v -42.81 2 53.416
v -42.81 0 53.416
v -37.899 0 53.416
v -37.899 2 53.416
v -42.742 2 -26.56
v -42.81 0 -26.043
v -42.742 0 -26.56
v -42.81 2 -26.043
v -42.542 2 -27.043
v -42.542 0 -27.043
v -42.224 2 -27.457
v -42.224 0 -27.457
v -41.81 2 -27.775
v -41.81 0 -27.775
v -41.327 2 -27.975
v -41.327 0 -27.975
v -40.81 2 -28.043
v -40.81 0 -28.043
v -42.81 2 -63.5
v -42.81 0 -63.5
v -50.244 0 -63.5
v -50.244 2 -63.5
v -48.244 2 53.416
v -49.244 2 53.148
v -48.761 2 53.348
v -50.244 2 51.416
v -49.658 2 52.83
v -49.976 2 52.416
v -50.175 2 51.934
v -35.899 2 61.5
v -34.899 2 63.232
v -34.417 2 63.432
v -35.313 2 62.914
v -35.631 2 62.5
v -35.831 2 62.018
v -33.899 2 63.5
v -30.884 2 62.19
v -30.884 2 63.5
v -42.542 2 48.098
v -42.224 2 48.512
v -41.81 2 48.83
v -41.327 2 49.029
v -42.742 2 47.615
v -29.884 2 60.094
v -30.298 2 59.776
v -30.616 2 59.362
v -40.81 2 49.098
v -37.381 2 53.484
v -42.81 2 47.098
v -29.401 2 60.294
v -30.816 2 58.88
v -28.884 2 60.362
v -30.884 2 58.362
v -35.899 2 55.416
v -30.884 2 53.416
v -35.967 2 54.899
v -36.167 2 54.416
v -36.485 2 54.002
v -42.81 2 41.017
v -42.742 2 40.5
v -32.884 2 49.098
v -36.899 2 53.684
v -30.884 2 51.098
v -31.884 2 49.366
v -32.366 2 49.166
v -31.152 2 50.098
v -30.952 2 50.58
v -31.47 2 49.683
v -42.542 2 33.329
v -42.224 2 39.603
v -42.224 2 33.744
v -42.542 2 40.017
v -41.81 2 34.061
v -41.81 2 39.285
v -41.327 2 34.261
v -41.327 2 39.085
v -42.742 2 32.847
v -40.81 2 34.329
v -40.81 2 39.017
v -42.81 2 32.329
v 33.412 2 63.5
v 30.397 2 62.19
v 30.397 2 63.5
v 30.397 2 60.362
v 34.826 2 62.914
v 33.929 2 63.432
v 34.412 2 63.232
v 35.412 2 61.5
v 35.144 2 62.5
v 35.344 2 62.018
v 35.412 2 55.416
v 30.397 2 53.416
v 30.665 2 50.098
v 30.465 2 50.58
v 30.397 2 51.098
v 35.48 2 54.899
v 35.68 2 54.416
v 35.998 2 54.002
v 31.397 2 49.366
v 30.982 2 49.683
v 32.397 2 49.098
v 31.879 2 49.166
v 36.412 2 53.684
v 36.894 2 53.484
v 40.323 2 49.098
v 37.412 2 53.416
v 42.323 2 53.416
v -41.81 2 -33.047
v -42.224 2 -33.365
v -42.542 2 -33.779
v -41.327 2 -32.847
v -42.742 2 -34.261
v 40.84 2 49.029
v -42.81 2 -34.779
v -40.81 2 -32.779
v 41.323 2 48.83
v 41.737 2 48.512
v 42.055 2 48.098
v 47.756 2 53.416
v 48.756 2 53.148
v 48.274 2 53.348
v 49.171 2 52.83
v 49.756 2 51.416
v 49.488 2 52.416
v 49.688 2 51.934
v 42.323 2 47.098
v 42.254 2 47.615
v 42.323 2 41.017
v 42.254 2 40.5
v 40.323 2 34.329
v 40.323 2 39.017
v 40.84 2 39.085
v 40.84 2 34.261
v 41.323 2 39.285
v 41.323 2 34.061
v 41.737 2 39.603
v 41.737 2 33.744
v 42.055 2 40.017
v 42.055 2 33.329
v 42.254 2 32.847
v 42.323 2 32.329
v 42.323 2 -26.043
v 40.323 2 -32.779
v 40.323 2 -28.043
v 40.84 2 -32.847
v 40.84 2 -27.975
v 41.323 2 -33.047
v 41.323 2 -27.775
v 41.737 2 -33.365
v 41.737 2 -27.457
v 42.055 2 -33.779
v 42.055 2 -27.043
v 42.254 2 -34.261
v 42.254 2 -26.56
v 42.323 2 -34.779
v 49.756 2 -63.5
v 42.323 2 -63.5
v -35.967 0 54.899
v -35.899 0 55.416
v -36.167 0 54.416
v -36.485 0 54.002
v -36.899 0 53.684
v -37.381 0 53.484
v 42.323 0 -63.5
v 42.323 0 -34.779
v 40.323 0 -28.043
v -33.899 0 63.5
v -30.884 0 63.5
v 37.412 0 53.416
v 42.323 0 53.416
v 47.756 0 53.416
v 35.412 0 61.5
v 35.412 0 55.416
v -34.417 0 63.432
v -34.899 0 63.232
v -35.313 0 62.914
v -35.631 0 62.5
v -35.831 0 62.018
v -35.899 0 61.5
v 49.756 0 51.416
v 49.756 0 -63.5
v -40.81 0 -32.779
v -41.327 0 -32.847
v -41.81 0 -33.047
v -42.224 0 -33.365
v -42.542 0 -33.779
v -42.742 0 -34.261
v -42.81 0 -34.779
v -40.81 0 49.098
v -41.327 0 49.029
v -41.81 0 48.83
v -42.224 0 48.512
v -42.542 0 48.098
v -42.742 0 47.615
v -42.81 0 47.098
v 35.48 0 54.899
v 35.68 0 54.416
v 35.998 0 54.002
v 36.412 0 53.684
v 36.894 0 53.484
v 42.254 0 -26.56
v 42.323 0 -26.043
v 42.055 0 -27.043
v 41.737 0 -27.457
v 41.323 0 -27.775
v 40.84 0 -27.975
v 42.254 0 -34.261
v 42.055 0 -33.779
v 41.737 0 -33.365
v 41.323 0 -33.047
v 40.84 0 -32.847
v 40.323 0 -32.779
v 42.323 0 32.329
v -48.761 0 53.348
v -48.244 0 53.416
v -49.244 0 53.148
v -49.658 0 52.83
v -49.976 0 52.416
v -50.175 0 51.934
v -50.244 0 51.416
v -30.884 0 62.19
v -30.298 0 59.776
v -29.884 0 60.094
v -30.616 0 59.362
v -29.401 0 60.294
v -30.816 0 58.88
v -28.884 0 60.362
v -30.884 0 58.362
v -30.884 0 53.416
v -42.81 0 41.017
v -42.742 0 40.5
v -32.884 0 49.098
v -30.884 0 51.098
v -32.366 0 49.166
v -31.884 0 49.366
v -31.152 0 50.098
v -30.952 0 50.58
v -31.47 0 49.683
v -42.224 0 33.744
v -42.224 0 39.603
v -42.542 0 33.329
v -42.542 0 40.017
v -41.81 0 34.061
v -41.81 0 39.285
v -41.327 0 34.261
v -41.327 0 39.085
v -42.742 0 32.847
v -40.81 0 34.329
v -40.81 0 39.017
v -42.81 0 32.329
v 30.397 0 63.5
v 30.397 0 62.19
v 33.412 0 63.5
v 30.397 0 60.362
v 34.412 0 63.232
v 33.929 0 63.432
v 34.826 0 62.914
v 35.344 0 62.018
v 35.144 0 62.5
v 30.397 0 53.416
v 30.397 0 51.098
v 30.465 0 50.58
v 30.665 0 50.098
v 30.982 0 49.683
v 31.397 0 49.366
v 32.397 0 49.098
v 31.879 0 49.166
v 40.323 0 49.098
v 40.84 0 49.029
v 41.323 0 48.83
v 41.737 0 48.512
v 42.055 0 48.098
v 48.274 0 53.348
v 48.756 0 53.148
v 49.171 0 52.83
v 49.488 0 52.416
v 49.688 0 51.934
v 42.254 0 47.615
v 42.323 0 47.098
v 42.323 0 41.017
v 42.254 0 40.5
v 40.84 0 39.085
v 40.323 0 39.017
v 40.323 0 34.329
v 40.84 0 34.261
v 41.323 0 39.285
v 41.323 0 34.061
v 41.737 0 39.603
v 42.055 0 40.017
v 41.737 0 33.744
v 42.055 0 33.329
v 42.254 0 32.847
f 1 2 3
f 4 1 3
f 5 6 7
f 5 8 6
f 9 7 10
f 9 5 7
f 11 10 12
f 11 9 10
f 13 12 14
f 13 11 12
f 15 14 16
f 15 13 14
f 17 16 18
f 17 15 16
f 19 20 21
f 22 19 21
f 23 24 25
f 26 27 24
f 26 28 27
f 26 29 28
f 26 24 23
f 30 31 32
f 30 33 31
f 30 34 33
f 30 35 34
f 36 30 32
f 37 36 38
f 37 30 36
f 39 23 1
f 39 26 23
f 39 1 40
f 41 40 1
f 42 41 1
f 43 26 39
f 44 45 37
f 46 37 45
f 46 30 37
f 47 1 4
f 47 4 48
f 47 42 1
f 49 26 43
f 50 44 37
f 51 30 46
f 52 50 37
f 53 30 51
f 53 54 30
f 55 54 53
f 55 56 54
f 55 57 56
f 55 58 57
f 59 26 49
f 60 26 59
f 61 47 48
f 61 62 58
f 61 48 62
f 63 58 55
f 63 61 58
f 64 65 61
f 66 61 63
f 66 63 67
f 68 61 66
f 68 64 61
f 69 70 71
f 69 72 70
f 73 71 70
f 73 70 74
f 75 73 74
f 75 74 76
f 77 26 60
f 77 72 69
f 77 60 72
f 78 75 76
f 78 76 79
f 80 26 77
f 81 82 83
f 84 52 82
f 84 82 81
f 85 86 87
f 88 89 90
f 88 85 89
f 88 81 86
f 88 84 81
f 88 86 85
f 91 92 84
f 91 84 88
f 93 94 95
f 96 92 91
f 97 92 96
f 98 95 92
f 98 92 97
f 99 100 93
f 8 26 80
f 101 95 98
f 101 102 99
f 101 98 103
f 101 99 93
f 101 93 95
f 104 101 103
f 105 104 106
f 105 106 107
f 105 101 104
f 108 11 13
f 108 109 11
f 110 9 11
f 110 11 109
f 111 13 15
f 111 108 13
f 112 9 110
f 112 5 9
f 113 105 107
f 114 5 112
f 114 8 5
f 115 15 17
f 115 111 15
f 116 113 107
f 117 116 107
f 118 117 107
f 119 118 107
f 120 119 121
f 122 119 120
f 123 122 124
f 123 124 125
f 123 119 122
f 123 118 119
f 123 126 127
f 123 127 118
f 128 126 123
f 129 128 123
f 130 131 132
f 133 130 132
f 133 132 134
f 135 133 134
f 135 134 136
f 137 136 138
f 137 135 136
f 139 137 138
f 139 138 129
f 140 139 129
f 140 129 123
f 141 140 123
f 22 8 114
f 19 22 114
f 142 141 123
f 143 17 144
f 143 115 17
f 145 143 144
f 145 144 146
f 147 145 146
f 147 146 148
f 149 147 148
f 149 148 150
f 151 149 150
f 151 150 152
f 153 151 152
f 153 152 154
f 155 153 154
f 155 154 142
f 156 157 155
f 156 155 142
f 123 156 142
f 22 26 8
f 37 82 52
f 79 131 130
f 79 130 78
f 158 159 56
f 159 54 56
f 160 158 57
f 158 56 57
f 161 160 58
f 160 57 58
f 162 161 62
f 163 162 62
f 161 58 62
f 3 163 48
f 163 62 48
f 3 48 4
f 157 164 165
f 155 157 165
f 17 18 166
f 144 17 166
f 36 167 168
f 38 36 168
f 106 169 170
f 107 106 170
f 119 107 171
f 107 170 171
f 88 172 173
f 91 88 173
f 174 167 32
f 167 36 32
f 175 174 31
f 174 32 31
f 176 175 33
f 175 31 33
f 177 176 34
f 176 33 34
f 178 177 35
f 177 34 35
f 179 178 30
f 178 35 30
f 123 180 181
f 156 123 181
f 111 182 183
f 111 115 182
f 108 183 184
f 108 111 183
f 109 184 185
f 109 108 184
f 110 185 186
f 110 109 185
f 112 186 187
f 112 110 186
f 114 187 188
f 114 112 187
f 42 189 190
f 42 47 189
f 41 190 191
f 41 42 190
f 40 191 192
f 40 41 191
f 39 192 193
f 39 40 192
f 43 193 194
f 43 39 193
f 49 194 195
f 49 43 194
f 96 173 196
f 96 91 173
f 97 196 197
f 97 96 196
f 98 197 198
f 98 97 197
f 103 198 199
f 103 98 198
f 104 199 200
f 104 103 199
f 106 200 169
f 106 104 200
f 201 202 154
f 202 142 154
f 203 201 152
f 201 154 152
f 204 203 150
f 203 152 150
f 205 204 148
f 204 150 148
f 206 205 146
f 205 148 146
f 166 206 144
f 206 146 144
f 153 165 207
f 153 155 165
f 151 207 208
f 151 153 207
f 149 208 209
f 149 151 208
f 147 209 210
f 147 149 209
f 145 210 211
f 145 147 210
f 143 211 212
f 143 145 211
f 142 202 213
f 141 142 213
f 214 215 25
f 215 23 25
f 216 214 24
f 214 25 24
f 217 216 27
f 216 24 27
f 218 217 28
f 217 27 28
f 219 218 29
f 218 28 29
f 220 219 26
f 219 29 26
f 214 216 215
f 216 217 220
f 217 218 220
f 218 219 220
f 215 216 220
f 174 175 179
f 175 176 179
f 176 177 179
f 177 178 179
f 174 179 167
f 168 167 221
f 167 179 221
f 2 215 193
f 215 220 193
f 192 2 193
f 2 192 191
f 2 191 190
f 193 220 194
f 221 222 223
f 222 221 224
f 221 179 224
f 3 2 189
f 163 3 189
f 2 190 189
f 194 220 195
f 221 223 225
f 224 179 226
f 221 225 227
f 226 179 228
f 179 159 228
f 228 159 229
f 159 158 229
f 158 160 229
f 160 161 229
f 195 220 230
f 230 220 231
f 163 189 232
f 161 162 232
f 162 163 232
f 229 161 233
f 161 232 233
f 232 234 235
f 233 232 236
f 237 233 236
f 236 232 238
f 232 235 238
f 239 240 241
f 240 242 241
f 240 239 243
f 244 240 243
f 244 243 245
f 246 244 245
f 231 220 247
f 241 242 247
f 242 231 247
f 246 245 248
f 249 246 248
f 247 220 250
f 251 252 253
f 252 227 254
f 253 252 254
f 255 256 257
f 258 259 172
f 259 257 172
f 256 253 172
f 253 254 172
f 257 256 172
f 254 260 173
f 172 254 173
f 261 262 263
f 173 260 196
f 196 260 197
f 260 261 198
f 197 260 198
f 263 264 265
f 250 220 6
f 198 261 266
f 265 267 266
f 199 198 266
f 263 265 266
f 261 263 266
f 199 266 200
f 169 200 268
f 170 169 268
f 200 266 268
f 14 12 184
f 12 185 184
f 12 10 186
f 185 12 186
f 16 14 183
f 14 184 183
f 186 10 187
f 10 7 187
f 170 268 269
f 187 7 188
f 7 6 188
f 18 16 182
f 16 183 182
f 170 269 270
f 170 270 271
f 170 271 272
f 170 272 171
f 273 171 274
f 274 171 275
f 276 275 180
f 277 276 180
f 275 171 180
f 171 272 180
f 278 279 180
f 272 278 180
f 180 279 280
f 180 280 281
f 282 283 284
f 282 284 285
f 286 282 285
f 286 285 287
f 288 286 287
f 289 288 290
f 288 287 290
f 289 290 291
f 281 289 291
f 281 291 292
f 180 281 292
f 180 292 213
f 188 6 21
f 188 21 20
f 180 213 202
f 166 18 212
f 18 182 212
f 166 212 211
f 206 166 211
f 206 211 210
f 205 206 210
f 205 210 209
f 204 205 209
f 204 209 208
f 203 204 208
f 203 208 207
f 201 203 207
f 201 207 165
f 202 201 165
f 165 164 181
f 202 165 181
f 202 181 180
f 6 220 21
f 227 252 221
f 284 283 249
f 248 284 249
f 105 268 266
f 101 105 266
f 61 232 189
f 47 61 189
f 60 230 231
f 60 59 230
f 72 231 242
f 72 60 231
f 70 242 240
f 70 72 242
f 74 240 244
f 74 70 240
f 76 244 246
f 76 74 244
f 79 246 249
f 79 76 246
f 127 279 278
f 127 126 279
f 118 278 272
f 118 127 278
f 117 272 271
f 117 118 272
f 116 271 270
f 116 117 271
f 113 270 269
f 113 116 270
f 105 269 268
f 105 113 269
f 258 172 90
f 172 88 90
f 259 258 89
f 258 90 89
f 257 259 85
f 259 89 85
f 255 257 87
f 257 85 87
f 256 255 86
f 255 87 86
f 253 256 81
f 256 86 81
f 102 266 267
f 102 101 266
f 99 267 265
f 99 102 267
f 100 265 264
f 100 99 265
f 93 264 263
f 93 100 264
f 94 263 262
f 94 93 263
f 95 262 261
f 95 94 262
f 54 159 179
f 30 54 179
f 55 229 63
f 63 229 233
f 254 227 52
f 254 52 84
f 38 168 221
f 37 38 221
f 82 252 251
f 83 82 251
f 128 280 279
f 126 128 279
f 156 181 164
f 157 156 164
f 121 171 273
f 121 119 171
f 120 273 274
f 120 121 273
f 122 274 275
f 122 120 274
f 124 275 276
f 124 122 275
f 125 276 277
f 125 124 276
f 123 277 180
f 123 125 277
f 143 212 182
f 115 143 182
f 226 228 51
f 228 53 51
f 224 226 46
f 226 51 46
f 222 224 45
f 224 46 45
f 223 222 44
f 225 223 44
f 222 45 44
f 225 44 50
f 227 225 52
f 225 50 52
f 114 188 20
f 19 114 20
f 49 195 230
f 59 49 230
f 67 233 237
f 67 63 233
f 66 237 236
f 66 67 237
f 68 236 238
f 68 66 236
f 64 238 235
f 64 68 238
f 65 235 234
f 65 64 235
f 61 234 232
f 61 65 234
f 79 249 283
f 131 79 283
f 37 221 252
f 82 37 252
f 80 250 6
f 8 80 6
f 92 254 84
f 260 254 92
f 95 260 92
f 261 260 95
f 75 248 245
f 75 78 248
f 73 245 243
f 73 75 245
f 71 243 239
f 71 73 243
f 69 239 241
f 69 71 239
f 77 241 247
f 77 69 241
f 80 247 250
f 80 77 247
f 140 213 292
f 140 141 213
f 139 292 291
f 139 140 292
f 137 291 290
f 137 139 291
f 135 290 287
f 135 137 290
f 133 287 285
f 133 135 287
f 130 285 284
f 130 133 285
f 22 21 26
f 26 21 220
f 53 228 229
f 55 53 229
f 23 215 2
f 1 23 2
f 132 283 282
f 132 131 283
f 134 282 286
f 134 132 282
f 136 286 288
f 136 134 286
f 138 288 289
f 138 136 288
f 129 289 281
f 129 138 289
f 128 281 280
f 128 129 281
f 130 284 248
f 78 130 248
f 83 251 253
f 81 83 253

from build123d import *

# Parameters (mm, degrees)
SKETCH_1_W      = 42.566219829
SKETCH_1_H      = 4.687941776
SKETCH_1_W_2    = 6.910818326
SKETCH_1_H_2    = 4.318604229
SKETCH_1_W_3    = 5.015201163
SKETCH_1_H_3    = 4.736132542
SKETCH_1_W_4    = 61.28040068
SKETCH_1_H_4    = 1.827886604
EXTRUDE_1_DEPTH = 2
FILLET_1_R      = 2
FILLET_2_R      = 2


with BuildPart() as part:
    # 草图1 → 凸台-拉伸1 (new body)
    with BuildSketch(Plane(origin=(0, 0, 0), x_dir=(1, 0, 0), z_dir=(0, 1, 0))):
        Polygon((-50.243578821, 63.5), (-50.243578821, -53.4162), (-42.80979865, -53.4162), (-42.80979865, -49.097595771), (-42.80979865, -39.017252134), (-42.80979865, -34.329310358), (-42.80979865, 28.04266881), (-42.80979865, 32.778801352), (-42.80979865, 63.5), align=None)
        with Locations((-21.526688736, -36.673281246)):
            Rectangle(SKETCH_1_W, SKETCH_1_H)
        with Locations((-39.354389487, -51.256897886)):
            Rectangle(SKETCH_1_W_2, SKETCH_1_H_2)
        with Locations((-33.391379742, -51.256897886)):
            Rectangle(SKETCH_1_W_3, SKETCH_1_H_2)
        Polygon((-35.898980324, -53.4162), (-35.898980324, -63.5), (-30.883779161, -63.5), (-30.883779161, -62.190126209), (-30.883779161, -60.362239605), (-30.883779161, -53.4162), align=None)
        with Locations((21.039531094, -36.673281246)):
            Rectangle(SKETCH_1_W, SKETCH_1_H)
        Polygon((30.396621519, -62.190126209), (30.396621519, -63.5), (35.411822682, -63.5), (35.411822682, -53.4162), (30.396621519, -53.4162), (30.396621519, -60.362239605), align=None)
        with Locations((38.867231845, -51.256897886)):
            Rectangle(SKETCH_1_W_2, SKETCH_1_H_2)
        with Locations((32.904222101, -51.256897886)):
            Rectangle(SKETCH_1_W_3, SKETCH_1_H_2)
        Polygon((49.756421179, 63.5), (42.322641008, 63.5), (42.322641008, 32.778801352), (42.322641008, 28.04266881), (42.322641008, -34.329310358), (42.322641008, -39.017252134), (42.322641008, -49.097595771), (42.322641008, -53.4162), (49.756421179, -53.4162), align=None)
        with Locations((21.039531094, 30.410735081)):
            Rectangle(SKETCH_1_W, SKETCH_1_H_3)
        with Locations((-21.526688736, 30.410735081)):
            Rectangle(SKETCH_1_W, SKETCH_1_H_3)
        with Locations((-0.243578821, -61.276182907)):
            Rectangle(SKETCH_1_W_4, SKETCH_1_H_4)
    extrude(amount=EXTRUDE_1_DEPTH)

    # 圆角1
    fillet_1_edges = [part.edges().sort_by_distance(p)[0] for p in [
        (42.322641008, 1, -28.04266881),
        (-42.80979865, 1, -28.04266881),
        (-42.80979865, 1, 34.329310358),
        (42.322641008, 1, 34.329310358),
        (-42.80979865, 1, 39.017252134),
        (-42.80979865, 1, 49.097595771),
        (-30.883779161, 1, 49.097595771),
        (-30.883779161, 1, 60.362239605),
        (30.396621519, 1, 49.097595771),
        (42.322641008, 1, 49.097595771),
        (42.322641008, 1, 39.017252134),
        (-42.80979865, 1, -32.778801352),
        (42.322641008, 1, -32.778801352),
        (35.411822682, 1, 53.4162),
    ]]
    fillet(fillet_1_edges, radius=FILLET_1_R)

    # 圆角2
    fillet_2_edges = [part.edges().sort_by_distance(p)[0] for p in [
        (-35.898980324, 1, 63.5),
        (-35.898980324, 1, 53.4162),
        (-50.243578821, 1, 53.4162),
        (49.756421179, 1, 53.4162),
        (35.411822682, 1, 63.5),
    ]]
    fillet(fillet_2_edges, radius=FILLET_2_R)


solid = part.part
